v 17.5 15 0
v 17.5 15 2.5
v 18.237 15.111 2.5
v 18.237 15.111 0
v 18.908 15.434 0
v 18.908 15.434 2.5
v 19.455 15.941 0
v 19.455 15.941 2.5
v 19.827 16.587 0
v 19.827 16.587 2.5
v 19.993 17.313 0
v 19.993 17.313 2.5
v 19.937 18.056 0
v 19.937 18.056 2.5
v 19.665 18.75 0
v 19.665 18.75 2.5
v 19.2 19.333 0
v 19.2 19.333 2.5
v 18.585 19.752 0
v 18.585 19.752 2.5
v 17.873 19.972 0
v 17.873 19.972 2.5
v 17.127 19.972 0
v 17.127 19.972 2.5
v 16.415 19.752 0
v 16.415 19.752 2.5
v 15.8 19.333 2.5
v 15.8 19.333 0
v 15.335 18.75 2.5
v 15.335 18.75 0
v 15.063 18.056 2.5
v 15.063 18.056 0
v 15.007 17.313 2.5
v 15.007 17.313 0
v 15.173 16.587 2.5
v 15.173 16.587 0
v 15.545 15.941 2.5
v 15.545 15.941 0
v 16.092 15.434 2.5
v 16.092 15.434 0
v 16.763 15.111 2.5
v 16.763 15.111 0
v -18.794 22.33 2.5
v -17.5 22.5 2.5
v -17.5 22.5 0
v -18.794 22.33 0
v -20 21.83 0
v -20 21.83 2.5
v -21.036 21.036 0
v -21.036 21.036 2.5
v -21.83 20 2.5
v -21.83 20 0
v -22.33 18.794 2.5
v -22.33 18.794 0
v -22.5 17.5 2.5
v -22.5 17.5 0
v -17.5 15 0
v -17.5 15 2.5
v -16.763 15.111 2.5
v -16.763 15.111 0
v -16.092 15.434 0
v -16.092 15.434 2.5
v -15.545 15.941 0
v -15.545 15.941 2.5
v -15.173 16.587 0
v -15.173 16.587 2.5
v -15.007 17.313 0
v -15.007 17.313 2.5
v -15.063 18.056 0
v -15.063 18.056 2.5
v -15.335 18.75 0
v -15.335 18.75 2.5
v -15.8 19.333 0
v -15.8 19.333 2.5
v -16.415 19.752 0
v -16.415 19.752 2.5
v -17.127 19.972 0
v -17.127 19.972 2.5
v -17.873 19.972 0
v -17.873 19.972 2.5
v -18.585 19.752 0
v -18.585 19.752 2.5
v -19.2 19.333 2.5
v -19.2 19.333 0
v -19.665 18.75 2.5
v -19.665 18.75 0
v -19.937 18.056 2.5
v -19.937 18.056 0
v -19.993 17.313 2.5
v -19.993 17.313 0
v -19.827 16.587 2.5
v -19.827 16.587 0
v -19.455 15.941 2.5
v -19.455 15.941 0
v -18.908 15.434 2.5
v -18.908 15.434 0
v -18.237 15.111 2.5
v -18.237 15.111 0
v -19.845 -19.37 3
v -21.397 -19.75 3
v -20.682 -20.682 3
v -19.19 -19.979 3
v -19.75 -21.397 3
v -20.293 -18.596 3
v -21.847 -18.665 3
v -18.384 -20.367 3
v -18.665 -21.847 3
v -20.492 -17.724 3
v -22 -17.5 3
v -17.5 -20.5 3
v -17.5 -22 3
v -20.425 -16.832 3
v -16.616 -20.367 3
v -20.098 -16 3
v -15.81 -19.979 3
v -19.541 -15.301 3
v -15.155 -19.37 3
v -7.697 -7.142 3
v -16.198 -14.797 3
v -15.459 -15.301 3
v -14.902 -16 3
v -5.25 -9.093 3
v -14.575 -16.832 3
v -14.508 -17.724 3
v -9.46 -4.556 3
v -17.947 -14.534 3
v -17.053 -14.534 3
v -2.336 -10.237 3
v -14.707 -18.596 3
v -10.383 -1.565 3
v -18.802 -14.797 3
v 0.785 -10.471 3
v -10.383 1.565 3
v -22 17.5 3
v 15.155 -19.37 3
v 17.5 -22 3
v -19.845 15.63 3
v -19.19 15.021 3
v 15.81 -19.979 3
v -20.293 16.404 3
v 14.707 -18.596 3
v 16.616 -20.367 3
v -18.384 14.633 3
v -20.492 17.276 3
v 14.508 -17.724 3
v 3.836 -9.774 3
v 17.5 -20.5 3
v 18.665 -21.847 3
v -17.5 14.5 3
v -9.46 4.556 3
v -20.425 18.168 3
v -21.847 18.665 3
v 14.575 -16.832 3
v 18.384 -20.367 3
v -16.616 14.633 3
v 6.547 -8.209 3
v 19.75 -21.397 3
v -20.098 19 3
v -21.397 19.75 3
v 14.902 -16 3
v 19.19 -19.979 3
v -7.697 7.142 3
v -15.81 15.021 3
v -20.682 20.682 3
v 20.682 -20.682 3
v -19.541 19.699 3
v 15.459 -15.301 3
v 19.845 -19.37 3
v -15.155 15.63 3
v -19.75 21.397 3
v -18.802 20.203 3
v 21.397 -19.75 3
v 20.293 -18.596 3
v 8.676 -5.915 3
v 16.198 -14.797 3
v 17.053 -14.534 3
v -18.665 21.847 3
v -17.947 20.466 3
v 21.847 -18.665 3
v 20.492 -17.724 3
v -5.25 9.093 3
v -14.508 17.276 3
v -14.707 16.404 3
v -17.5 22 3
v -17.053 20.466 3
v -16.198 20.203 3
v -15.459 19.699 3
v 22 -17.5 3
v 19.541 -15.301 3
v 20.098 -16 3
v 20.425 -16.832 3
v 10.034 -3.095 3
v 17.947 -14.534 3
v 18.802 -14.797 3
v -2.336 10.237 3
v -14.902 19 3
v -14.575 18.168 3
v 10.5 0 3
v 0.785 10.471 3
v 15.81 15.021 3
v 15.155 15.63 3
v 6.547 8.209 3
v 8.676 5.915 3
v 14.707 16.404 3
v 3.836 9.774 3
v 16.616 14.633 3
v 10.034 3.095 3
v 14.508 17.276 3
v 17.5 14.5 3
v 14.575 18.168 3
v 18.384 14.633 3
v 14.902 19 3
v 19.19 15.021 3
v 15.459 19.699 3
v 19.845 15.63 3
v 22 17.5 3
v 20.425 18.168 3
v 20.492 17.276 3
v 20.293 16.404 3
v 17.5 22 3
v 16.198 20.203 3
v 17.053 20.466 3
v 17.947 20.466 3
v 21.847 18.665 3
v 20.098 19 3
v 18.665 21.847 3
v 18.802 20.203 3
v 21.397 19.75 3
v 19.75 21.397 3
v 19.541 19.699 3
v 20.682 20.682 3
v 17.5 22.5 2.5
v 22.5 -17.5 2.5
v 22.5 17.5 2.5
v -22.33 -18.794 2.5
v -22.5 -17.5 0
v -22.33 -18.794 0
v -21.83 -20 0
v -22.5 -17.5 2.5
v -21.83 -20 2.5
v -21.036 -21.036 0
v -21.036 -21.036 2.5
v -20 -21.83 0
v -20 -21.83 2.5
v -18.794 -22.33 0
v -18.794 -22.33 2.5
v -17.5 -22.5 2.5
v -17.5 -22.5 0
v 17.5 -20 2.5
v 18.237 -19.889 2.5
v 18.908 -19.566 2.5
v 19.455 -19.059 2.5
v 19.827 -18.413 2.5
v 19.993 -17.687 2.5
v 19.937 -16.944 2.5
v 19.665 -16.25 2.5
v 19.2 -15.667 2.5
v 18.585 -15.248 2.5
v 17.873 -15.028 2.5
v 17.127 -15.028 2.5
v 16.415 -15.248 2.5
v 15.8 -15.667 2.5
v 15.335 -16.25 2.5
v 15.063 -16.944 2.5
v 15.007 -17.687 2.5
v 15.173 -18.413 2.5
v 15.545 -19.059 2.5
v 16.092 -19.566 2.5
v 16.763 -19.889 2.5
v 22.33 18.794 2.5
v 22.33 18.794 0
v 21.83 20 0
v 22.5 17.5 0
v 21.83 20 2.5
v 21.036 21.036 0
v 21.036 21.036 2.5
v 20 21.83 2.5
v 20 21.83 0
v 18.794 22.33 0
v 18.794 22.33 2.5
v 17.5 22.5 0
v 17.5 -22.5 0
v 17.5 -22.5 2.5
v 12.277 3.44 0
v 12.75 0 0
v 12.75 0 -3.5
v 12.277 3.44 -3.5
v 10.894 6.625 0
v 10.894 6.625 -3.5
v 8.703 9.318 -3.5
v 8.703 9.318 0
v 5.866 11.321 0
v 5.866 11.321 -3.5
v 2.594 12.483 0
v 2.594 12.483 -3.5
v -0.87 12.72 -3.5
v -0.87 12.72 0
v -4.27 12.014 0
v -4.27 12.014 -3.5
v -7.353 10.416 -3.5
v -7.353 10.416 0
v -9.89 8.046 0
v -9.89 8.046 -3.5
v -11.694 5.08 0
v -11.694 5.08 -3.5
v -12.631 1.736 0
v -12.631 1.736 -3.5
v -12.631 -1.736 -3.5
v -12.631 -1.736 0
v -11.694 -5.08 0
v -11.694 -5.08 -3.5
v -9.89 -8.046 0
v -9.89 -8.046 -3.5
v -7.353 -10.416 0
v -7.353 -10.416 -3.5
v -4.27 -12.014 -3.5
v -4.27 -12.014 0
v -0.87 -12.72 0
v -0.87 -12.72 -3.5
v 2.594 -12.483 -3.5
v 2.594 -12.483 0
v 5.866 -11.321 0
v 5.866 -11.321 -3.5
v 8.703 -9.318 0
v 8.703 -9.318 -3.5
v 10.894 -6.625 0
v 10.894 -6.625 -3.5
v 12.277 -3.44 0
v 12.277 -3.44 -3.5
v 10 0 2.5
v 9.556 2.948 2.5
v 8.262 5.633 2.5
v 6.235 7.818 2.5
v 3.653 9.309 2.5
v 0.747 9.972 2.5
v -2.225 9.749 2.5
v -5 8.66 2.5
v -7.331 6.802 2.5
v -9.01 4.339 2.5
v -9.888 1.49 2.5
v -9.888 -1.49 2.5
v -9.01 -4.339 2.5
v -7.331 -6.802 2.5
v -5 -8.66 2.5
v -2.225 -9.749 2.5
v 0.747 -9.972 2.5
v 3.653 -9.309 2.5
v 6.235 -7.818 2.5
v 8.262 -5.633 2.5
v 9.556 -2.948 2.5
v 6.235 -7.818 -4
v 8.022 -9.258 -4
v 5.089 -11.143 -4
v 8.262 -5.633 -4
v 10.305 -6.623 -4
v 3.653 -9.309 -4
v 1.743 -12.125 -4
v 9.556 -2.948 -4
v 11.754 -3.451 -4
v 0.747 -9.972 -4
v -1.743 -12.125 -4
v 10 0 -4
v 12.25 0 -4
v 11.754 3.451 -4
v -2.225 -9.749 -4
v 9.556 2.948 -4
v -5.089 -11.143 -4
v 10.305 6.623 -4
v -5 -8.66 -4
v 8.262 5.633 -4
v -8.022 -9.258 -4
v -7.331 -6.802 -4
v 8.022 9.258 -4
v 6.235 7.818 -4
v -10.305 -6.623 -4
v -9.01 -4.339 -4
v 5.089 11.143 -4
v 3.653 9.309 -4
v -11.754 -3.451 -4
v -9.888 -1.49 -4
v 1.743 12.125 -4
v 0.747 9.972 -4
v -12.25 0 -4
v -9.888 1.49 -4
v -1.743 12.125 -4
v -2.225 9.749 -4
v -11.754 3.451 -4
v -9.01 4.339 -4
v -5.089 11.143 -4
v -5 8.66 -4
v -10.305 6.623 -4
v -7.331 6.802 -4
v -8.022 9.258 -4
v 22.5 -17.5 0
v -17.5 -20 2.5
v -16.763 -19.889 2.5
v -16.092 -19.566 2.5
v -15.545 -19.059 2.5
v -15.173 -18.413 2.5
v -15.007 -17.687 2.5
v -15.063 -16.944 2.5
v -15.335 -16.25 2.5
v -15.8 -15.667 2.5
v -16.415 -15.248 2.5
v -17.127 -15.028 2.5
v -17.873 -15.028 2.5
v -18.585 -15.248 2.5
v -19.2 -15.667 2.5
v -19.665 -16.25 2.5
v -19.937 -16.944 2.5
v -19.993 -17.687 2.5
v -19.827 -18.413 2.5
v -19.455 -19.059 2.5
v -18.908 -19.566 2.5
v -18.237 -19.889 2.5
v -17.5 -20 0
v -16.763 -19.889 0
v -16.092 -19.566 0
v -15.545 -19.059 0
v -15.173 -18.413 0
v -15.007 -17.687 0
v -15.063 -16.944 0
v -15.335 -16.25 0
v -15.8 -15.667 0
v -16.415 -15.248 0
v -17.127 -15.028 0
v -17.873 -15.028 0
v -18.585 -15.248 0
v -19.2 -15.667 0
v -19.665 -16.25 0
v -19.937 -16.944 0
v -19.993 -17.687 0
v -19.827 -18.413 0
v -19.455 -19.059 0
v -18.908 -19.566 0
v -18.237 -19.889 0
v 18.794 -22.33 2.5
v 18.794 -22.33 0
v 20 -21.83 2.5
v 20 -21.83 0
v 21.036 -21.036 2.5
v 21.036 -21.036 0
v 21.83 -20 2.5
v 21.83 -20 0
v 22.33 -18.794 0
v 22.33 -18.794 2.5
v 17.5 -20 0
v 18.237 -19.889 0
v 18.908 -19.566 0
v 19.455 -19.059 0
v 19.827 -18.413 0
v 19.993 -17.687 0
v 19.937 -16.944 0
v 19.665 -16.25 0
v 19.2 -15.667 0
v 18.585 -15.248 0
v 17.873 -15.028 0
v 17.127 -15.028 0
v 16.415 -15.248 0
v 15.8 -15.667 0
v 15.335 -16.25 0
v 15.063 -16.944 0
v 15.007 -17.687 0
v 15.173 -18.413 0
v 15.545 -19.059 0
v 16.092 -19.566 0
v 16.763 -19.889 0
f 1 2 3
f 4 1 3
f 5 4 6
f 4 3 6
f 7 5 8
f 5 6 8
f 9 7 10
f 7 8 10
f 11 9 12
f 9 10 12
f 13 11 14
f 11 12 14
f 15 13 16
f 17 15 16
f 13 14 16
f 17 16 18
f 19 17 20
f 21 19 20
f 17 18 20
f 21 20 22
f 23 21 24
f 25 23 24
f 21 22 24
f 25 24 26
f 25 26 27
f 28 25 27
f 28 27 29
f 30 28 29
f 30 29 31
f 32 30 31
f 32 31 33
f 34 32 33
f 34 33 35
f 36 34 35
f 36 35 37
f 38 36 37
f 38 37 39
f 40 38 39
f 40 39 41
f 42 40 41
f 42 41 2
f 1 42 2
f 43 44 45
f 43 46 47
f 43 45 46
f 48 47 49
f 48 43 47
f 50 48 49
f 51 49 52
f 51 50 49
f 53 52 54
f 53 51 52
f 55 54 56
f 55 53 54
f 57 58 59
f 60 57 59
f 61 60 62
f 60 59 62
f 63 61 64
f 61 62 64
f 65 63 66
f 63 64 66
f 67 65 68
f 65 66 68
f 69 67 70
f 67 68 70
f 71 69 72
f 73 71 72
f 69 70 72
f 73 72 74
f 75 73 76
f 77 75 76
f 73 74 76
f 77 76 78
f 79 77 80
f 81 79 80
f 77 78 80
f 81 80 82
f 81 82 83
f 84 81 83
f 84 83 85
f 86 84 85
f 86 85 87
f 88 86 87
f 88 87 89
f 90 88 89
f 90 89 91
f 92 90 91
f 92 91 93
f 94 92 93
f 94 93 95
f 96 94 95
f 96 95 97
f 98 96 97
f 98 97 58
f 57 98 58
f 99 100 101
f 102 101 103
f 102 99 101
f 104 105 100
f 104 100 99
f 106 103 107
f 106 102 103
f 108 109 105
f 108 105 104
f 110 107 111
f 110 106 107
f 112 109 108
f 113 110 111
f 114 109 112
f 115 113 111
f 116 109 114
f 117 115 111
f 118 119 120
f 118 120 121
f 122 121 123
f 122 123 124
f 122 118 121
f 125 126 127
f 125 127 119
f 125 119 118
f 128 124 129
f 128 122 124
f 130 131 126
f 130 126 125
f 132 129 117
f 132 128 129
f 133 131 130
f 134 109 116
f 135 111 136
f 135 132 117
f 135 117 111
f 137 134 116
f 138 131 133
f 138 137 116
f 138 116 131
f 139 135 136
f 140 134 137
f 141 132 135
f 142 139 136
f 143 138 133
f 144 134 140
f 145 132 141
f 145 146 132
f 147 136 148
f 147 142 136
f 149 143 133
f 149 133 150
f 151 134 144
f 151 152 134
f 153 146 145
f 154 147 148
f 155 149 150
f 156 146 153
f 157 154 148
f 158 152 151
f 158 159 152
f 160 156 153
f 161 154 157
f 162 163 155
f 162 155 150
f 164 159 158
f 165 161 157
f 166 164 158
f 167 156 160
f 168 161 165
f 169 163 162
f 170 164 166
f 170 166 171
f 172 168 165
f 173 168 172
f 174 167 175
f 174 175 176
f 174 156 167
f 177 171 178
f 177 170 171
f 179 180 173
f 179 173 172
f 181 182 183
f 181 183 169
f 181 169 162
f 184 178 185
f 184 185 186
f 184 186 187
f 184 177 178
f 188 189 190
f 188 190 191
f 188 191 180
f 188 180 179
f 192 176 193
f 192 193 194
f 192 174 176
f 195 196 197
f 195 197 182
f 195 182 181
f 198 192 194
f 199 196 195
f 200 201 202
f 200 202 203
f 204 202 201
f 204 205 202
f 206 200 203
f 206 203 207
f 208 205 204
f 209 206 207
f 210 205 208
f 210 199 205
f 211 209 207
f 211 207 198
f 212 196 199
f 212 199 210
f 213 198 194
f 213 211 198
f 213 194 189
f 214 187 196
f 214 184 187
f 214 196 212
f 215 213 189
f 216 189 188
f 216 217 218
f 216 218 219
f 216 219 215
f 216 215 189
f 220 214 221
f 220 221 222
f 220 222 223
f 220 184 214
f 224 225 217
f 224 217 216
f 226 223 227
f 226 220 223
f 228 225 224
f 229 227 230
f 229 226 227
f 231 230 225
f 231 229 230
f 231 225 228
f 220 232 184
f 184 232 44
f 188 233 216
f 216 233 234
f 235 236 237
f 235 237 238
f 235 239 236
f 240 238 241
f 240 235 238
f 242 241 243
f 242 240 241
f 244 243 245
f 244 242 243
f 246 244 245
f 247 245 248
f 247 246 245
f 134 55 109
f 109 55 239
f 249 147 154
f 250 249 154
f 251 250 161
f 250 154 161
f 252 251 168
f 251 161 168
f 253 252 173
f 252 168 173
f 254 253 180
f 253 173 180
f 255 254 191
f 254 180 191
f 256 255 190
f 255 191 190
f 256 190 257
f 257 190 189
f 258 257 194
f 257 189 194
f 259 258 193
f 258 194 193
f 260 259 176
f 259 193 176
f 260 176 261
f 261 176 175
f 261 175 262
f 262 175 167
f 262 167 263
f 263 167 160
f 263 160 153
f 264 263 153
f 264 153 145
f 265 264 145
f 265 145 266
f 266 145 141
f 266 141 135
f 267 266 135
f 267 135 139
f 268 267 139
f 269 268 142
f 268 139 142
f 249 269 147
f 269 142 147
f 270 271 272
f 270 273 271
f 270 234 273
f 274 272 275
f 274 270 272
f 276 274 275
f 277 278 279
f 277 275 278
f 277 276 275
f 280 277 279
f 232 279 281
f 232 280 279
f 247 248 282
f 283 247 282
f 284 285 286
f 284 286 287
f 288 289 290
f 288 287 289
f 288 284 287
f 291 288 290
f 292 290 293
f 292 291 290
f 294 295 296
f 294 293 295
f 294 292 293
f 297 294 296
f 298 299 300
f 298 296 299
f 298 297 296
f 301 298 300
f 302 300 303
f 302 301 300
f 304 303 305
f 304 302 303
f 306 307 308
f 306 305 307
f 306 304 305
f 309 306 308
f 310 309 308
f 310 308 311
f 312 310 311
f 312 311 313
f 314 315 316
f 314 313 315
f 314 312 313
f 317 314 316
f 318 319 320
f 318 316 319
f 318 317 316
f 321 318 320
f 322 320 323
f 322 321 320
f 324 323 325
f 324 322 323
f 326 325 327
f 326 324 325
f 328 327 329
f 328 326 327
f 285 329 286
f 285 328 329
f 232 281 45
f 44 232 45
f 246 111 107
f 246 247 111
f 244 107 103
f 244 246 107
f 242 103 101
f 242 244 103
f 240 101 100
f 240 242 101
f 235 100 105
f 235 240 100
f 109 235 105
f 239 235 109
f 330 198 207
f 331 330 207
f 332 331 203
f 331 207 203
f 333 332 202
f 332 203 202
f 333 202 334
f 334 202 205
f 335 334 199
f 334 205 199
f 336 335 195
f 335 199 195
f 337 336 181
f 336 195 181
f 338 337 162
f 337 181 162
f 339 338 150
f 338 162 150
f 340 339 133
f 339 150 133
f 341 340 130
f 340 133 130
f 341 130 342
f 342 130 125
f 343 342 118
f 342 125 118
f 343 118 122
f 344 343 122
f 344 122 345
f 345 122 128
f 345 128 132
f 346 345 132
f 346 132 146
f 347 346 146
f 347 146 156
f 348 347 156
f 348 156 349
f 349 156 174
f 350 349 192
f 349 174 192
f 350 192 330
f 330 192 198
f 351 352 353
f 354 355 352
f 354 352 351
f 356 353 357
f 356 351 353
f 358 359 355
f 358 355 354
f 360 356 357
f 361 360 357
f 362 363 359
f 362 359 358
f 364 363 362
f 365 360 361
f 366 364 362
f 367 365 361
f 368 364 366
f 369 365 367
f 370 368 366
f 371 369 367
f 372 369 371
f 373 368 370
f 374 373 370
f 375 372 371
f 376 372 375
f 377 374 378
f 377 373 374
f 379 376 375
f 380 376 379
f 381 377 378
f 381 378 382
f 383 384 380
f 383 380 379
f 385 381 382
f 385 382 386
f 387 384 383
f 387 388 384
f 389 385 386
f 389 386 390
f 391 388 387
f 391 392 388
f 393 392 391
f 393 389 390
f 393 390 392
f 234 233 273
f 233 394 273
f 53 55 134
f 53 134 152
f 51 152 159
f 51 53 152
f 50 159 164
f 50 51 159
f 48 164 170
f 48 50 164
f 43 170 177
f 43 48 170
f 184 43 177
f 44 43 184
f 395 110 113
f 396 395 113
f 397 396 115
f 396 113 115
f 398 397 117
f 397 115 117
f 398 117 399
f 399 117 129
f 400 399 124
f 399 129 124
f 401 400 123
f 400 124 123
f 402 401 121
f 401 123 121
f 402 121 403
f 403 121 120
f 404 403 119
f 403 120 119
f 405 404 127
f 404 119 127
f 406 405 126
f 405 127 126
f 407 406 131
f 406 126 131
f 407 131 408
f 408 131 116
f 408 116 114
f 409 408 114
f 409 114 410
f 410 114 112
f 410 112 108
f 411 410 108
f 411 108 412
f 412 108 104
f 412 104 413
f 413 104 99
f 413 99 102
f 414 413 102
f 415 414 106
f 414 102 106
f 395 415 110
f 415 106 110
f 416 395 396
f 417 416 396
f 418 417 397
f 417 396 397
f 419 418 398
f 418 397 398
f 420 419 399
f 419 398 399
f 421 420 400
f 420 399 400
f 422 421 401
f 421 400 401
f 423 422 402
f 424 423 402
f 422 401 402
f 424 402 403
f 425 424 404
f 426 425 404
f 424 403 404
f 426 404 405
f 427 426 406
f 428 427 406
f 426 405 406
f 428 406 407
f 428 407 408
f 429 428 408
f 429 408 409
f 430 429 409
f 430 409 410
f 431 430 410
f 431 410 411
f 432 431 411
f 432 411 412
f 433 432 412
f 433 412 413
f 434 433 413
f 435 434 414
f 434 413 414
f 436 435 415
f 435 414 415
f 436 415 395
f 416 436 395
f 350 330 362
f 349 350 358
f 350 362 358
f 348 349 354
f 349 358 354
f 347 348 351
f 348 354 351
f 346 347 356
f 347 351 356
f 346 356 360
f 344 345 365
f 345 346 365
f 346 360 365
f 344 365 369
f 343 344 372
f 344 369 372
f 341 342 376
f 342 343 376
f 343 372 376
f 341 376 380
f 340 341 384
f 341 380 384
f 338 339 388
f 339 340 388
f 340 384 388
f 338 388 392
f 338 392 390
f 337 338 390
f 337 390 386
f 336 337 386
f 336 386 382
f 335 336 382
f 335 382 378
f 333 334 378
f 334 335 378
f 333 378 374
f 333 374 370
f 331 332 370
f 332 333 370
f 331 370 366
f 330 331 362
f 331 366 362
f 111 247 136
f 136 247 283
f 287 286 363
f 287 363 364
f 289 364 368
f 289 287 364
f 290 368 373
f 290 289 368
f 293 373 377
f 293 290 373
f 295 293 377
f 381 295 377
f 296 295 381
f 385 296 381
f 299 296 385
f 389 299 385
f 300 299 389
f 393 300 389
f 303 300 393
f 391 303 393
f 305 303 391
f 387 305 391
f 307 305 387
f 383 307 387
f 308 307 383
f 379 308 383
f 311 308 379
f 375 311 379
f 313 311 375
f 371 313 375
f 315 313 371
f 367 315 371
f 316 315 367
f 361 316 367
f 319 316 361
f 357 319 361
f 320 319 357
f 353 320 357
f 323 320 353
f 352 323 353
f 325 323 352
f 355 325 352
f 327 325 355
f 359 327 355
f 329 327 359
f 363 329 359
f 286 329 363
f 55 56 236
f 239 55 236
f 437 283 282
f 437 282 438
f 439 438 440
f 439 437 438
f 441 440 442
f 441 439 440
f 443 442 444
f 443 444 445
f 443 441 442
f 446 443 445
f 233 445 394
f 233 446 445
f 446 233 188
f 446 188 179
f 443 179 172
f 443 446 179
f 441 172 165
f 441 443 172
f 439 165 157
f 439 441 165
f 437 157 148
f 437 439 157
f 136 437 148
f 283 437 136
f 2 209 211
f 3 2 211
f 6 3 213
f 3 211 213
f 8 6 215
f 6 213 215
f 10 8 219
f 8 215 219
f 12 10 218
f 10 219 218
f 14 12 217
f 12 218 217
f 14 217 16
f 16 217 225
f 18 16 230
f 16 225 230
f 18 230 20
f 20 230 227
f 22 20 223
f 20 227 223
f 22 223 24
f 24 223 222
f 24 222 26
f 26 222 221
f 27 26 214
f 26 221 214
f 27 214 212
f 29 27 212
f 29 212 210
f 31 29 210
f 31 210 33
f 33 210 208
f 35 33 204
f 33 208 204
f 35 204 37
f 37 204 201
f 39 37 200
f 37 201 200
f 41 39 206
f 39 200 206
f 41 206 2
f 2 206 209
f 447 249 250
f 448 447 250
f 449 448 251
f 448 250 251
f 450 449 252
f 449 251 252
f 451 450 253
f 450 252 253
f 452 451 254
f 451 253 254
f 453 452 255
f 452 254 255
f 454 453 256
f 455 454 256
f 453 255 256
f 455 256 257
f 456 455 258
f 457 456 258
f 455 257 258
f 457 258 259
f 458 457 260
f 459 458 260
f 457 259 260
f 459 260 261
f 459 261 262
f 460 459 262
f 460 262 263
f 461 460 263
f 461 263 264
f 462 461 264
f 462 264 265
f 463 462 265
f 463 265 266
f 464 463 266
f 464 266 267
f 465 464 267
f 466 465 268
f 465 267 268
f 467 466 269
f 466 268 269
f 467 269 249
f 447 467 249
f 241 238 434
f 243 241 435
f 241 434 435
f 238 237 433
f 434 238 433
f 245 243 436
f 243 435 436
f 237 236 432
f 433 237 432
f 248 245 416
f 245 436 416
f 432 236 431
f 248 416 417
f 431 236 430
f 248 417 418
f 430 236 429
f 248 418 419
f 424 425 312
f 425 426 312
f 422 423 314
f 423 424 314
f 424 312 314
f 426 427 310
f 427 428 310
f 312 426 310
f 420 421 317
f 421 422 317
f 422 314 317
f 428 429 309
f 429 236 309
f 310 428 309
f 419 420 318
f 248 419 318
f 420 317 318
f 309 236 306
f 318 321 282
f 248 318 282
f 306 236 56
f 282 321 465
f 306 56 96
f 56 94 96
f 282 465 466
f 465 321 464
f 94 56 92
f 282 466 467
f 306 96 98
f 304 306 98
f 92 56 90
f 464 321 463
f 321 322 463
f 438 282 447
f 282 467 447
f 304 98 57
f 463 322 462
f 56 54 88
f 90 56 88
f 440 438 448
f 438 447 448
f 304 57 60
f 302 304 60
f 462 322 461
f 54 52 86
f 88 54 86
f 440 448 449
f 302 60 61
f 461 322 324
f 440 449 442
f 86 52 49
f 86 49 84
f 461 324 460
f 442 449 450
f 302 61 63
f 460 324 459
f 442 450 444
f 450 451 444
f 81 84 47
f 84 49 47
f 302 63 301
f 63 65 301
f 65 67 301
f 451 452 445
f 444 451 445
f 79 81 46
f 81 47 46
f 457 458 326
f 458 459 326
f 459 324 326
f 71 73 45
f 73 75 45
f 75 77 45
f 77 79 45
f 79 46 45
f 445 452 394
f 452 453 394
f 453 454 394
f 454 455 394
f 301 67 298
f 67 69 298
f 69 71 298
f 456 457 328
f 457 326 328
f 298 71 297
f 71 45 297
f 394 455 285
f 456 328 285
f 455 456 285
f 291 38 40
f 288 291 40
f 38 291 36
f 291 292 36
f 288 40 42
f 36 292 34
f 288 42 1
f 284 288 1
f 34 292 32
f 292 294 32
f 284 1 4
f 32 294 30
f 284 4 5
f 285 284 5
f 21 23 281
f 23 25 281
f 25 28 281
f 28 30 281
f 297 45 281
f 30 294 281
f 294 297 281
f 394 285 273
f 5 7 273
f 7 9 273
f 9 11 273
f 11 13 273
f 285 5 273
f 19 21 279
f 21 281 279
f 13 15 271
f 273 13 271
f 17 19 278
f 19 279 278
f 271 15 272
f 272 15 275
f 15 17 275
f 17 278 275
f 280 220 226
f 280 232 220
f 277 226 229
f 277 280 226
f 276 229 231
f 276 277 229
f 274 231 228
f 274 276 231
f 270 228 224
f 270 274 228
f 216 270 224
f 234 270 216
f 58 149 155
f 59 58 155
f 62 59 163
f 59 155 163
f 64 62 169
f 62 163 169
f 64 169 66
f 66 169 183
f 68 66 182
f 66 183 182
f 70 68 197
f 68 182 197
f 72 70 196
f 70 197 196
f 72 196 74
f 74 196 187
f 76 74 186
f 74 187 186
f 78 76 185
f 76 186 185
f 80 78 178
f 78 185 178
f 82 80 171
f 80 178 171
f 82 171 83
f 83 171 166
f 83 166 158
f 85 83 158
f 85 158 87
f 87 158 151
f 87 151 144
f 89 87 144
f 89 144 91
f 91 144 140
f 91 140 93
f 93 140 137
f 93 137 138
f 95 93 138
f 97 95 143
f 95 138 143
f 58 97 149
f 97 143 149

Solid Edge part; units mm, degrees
sketch "Sketch1" plane through (0, 0, 0) normal (0, 0, 1) x (1, 0, 0)
  line L0 (-22.5, 22.5) -> (-22.5, -22.5)
  line L1 (-22.5, -22.5) -> (22.5, -22.5)
  line L2 (22.5, -22.5) -> (22.5, 22.5)
  line L3 (22.5, 22.5) -> (-22.5, 22.5)
  circle A0 centre (0, 0) radius 10
extrude "Extrusionsausprägung_22" add sketch "Sketch1" along normal blind 3
sketch "Sketch2" plane through (0, 0, 0) normal (0, 0, -1) x (1, 0, 0)
  circle A0 centre (0, 0) radius 12.75
  circle A1 centre (0, 0) radius 10
extrude "Extrusionsausprägung_23" add sketch "Sketch2" along normal blind 4
hole "Bohrung_12" at (17.5, -17.5, 3) direction (0, 0, -1) diameter 5 end up to next
hole "Hole1" at (-17.5, -17.5, 3) direction (0, 0, -1) diameter 5 end up to next
hole "Hole2" at (-17.5, 17.5, 3) direction (0, 0, -1) diameter 5 end up to next
hole "Hole3" at (17.5, 17.5, 3) direction (0, 0, -1) diameter 5 end up to next
fillet "Verrundung_18" radius 5 4 edges at (-22.5, -22.5, 1.5) (22.5, -22.5, 1.5) (-22.5, 22.5, 1.5) (22.5, 22.5, 1.5)
chamfer "Fase_11" distance 0.5 angle 45 13 edges at (20, 17.5, 3) (-15, 17.5, 3) (-15, -17.5, 3) (20, -17.5, 3) (-10, 0, 3) (22.5, 0, 3) (21.0355, 21.0355, 3) (0, 22.5, 3) (-21.0355, 21.0355, 3) (-22.5, 0, 3) (-21.0355, -21.0355, 3) (0, -22.5, 3) (21.0355, -21.0355, 3)
chamfer "Fase_12" distance 0.5 angle 45 1 edges at (-12.75, 0, -4)
